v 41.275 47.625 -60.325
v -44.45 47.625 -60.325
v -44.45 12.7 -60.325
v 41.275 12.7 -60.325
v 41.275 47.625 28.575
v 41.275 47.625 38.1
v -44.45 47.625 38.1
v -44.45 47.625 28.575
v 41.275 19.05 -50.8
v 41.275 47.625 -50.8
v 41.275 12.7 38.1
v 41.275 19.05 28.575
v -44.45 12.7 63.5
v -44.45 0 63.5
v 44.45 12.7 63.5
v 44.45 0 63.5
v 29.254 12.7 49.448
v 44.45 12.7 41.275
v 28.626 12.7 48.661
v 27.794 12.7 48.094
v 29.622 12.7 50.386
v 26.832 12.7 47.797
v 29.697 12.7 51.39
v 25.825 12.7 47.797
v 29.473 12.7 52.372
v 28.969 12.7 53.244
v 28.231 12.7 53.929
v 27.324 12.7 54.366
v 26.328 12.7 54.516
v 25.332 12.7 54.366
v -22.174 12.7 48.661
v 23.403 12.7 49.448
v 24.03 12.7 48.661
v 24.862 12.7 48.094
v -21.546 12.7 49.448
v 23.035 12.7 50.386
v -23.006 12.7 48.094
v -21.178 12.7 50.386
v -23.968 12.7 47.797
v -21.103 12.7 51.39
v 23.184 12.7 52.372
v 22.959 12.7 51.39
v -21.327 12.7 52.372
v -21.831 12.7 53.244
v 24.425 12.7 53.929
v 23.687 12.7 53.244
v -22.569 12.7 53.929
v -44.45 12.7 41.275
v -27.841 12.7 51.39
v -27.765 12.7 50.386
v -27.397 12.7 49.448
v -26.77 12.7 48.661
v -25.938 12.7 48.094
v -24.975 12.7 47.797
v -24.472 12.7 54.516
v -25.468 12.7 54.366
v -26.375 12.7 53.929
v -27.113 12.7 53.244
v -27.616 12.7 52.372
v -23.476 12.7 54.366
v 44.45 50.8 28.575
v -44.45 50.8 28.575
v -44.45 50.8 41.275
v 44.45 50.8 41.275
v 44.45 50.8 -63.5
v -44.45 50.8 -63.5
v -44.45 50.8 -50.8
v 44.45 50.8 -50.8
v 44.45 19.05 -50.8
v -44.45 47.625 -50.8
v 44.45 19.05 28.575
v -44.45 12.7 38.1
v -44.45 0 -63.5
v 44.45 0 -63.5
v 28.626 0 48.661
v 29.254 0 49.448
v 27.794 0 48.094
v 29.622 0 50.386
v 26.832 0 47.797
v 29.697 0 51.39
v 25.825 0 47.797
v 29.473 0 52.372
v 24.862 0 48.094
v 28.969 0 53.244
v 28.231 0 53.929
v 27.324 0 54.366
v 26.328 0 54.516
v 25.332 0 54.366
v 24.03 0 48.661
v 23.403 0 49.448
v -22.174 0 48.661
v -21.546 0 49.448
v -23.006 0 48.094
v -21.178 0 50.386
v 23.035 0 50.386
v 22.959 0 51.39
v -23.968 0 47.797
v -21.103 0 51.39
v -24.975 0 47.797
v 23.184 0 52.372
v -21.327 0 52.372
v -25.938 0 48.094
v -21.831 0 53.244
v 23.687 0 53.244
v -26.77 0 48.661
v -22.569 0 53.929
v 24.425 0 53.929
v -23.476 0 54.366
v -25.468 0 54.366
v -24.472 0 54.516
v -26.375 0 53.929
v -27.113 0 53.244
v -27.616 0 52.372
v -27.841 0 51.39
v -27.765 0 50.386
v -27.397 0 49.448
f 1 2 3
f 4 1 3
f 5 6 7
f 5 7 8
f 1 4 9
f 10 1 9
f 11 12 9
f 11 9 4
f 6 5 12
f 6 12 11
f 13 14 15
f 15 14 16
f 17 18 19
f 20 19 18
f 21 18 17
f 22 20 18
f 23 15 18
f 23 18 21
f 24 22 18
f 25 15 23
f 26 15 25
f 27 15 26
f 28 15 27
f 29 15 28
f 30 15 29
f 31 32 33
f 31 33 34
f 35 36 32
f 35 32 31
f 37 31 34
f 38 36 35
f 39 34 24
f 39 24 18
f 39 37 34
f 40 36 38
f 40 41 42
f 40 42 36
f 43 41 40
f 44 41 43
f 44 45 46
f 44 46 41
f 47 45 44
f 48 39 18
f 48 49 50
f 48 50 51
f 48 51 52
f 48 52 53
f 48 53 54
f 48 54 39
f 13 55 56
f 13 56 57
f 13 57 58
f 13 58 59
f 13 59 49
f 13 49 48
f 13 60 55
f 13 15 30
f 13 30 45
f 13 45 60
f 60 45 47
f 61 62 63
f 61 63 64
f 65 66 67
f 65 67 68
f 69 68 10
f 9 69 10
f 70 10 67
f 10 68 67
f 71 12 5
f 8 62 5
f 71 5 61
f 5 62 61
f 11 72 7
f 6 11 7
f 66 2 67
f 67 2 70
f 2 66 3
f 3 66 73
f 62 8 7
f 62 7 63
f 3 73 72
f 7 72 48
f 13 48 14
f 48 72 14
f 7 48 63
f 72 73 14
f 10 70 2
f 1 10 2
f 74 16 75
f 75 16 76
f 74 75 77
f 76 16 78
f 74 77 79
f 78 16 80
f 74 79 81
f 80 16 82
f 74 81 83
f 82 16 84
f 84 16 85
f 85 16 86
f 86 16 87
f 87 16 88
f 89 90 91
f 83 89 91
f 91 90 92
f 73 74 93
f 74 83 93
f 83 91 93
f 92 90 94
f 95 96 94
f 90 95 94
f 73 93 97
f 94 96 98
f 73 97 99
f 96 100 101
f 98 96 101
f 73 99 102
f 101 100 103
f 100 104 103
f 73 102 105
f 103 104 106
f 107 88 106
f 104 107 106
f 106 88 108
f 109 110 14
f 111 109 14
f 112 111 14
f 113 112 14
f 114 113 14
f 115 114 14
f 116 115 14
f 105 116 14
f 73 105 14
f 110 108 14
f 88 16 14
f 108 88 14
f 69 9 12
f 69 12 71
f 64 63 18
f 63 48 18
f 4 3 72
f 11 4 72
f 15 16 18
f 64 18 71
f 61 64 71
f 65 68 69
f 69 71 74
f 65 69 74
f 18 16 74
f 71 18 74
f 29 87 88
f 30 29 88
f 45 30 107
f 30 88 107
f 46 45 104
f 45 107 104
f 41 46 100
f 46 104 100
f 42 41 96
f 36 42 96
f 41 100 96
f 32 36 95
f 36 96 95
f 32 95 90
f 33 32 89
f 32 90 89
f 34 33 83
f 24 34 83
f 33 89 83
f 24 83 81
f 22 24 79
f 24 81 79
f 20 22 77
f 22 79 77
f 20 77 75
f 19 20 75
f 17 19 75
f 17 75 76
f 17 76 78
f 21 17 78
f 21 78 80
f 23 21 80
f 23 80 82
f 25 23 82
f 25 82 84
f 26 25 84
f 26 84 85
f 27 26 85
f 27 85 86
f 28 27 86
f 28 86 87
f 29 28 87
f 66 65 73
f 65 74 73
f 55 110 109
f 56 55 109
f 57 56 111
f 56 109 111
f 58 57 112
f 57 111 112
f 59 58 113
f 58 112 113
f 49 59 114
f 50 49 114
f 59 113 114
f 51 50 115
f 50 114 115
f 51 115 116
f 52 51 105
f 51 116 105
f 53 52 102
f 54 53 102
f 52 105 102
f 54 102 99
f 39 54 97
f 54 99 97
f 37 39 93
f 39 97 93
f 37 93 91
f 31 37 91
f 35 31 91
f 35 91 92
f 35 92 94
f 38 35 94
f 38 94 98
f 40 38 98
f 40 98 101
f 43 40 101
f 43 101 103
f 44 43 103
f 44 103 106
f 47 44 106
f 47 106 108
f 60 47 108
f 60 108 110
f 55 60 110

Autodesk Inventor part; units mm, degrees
ref_plane "YZ Plane" through (0, 0, 0) normal (1, 0, 0) x (0, 1, 0)
ref_plane "XZ Plane" through (0, 0, 0) normal (0, 1, 0) x (-1, 0, 0)
ref_plane "XY Plane" through (0, 0, 0) normal (0, 0, 1) x (1, 0, 0)
sketch "Sketch1" plane through (0, 0, 0) normal (0, 1, 0) x (-1, 0, 0)
  line L0 (-44.45, -63.5) -> (44.45, -63.5)
  line L1 (44.45, -63.5) -> (44.45, 63.5)
  line L2 (44.45, 63.5) -> (-44.45, 63.5)
  line L3 (-44.45, 63.5) -> (-44.45, -63.5)
  line L4 (-44.45, -63.5) -> (44.45, 63.5) construction
  line L5 (44.45, -63.5) -> (-44.45, 63.5) construction
  point P0 (0, 0)
  dimension "d0" = 127
  dimension "d1" = 88.9
extrude "Extrusion1" add sketch "Sketch1" along normal blind 12.7
sketch "Sketch2" plane through (0, 12.7, 0) normal (0, 1, 0) x (1, 0, 0)
  line L0 (44.45, 63.5) -> (-44.45, 63.5) projected
  line L1 (-44.45, 63.5) -> (-44.45, -63.5) projected
  line L2 (44.45, 63.5) -> (-44.45, 63.5)
  line L3 (-44.45, 63.5) -> (-44.45, -41.275)
  line L4 (-44.45, -41.275) -> (44.45, -41.275)
  line L5 (44.45, -41.275) -> (44.45, 63.5)
  point P0 (0, 0)
  dimension "d4" = 104.775
extrude "Extrusion2" add sketch "Sketch2" along normal blind 38.1
sketch "Sketch4" plane through (-44.45, 0, -63.5) normal (-1, 0, 0) x (0, 0, 1)
  line L0 (101.6, 47.625) -> (3.175, 47.625)
  line L1 (3.175, 47.625) -> (3.175, 12.7)
  line L2 (3.175, 12.7) -> (101.6, 12.7)
  line L3 (101.6, 12.7) -> (101.6, 47.625)
  line L4 (0, 0) -> (0, 50.8) projected
  line L5 (0, 50.8) -> (104.775, 50.8) projected
  line L6 (104.775, 12.7) -> (104.775, 50.8) projected
  line L7 (0, 0) -> (127, 0) projected
  point P0 (63.5, 0)
  dimension "d11" = 3.175
  dimension "d12" = 3.175
  dimension "d13" = 3.175
  dimension "d14" = 12.7
extrude "Extrusion3" cut sketch "Sketch4" against normal blind 85.725
sketch "Sketch5" plane through (0, 50.8, 0) normal (0, 1, 0) x (1, 0, 0)
  line L0 (-44.45, 63.5) -> (-44.45, -41.275) projected
  line L1 (44.45, -63.5) -> (44.45, 63.5) projected
  line L2 (-44.45, -28.575) -> (44.45, -28.575)
  line L3 (44.45, -28.575) -> (44.45, 50.8)
  line L4 (44.45, 50.8) -> (-44.45, 50.8)
  line L5 (-44.45, 50.8) -> (-44.45, -28.575)
  line L6 (44.45, 63.5) -> (-44.45, 63.5) projected
  line L7 (-44.45, -41.275) -> (44.45, -41.275) projected
  point P0 (0, 0)
  dimension "d17" = 12.7
  dimension "d18" = 12.7
extrude "Extrusion4" cut sketch "Sketch5" against normal blind 31.75 contours L4 L1 L2 L0
sketch "Sketch6" plane through (0, 12.7, 0) normal (0, 1, 0) x (1, 0, 0)
  line L0 (44.45, -63.5) -> (44.45, -41.275) projected
  point P0 (0, 0)
  point P1 (-24.4718, -51.1375)
  point P2 (26.3282, -51.1375)
  dimension "d21" = 50.8
hole "Hole1" at (-24.4718, 12.7, 51.1375) at (26.3282, 12.7, 51.1375) direction (0, -1, 0) diameter 6.7564 end through all clearance for "Flat Head Machine Screw (82)" size "1/4" standard "Ansi Unified Screw Threads"
properties part number "KVM Holder"
